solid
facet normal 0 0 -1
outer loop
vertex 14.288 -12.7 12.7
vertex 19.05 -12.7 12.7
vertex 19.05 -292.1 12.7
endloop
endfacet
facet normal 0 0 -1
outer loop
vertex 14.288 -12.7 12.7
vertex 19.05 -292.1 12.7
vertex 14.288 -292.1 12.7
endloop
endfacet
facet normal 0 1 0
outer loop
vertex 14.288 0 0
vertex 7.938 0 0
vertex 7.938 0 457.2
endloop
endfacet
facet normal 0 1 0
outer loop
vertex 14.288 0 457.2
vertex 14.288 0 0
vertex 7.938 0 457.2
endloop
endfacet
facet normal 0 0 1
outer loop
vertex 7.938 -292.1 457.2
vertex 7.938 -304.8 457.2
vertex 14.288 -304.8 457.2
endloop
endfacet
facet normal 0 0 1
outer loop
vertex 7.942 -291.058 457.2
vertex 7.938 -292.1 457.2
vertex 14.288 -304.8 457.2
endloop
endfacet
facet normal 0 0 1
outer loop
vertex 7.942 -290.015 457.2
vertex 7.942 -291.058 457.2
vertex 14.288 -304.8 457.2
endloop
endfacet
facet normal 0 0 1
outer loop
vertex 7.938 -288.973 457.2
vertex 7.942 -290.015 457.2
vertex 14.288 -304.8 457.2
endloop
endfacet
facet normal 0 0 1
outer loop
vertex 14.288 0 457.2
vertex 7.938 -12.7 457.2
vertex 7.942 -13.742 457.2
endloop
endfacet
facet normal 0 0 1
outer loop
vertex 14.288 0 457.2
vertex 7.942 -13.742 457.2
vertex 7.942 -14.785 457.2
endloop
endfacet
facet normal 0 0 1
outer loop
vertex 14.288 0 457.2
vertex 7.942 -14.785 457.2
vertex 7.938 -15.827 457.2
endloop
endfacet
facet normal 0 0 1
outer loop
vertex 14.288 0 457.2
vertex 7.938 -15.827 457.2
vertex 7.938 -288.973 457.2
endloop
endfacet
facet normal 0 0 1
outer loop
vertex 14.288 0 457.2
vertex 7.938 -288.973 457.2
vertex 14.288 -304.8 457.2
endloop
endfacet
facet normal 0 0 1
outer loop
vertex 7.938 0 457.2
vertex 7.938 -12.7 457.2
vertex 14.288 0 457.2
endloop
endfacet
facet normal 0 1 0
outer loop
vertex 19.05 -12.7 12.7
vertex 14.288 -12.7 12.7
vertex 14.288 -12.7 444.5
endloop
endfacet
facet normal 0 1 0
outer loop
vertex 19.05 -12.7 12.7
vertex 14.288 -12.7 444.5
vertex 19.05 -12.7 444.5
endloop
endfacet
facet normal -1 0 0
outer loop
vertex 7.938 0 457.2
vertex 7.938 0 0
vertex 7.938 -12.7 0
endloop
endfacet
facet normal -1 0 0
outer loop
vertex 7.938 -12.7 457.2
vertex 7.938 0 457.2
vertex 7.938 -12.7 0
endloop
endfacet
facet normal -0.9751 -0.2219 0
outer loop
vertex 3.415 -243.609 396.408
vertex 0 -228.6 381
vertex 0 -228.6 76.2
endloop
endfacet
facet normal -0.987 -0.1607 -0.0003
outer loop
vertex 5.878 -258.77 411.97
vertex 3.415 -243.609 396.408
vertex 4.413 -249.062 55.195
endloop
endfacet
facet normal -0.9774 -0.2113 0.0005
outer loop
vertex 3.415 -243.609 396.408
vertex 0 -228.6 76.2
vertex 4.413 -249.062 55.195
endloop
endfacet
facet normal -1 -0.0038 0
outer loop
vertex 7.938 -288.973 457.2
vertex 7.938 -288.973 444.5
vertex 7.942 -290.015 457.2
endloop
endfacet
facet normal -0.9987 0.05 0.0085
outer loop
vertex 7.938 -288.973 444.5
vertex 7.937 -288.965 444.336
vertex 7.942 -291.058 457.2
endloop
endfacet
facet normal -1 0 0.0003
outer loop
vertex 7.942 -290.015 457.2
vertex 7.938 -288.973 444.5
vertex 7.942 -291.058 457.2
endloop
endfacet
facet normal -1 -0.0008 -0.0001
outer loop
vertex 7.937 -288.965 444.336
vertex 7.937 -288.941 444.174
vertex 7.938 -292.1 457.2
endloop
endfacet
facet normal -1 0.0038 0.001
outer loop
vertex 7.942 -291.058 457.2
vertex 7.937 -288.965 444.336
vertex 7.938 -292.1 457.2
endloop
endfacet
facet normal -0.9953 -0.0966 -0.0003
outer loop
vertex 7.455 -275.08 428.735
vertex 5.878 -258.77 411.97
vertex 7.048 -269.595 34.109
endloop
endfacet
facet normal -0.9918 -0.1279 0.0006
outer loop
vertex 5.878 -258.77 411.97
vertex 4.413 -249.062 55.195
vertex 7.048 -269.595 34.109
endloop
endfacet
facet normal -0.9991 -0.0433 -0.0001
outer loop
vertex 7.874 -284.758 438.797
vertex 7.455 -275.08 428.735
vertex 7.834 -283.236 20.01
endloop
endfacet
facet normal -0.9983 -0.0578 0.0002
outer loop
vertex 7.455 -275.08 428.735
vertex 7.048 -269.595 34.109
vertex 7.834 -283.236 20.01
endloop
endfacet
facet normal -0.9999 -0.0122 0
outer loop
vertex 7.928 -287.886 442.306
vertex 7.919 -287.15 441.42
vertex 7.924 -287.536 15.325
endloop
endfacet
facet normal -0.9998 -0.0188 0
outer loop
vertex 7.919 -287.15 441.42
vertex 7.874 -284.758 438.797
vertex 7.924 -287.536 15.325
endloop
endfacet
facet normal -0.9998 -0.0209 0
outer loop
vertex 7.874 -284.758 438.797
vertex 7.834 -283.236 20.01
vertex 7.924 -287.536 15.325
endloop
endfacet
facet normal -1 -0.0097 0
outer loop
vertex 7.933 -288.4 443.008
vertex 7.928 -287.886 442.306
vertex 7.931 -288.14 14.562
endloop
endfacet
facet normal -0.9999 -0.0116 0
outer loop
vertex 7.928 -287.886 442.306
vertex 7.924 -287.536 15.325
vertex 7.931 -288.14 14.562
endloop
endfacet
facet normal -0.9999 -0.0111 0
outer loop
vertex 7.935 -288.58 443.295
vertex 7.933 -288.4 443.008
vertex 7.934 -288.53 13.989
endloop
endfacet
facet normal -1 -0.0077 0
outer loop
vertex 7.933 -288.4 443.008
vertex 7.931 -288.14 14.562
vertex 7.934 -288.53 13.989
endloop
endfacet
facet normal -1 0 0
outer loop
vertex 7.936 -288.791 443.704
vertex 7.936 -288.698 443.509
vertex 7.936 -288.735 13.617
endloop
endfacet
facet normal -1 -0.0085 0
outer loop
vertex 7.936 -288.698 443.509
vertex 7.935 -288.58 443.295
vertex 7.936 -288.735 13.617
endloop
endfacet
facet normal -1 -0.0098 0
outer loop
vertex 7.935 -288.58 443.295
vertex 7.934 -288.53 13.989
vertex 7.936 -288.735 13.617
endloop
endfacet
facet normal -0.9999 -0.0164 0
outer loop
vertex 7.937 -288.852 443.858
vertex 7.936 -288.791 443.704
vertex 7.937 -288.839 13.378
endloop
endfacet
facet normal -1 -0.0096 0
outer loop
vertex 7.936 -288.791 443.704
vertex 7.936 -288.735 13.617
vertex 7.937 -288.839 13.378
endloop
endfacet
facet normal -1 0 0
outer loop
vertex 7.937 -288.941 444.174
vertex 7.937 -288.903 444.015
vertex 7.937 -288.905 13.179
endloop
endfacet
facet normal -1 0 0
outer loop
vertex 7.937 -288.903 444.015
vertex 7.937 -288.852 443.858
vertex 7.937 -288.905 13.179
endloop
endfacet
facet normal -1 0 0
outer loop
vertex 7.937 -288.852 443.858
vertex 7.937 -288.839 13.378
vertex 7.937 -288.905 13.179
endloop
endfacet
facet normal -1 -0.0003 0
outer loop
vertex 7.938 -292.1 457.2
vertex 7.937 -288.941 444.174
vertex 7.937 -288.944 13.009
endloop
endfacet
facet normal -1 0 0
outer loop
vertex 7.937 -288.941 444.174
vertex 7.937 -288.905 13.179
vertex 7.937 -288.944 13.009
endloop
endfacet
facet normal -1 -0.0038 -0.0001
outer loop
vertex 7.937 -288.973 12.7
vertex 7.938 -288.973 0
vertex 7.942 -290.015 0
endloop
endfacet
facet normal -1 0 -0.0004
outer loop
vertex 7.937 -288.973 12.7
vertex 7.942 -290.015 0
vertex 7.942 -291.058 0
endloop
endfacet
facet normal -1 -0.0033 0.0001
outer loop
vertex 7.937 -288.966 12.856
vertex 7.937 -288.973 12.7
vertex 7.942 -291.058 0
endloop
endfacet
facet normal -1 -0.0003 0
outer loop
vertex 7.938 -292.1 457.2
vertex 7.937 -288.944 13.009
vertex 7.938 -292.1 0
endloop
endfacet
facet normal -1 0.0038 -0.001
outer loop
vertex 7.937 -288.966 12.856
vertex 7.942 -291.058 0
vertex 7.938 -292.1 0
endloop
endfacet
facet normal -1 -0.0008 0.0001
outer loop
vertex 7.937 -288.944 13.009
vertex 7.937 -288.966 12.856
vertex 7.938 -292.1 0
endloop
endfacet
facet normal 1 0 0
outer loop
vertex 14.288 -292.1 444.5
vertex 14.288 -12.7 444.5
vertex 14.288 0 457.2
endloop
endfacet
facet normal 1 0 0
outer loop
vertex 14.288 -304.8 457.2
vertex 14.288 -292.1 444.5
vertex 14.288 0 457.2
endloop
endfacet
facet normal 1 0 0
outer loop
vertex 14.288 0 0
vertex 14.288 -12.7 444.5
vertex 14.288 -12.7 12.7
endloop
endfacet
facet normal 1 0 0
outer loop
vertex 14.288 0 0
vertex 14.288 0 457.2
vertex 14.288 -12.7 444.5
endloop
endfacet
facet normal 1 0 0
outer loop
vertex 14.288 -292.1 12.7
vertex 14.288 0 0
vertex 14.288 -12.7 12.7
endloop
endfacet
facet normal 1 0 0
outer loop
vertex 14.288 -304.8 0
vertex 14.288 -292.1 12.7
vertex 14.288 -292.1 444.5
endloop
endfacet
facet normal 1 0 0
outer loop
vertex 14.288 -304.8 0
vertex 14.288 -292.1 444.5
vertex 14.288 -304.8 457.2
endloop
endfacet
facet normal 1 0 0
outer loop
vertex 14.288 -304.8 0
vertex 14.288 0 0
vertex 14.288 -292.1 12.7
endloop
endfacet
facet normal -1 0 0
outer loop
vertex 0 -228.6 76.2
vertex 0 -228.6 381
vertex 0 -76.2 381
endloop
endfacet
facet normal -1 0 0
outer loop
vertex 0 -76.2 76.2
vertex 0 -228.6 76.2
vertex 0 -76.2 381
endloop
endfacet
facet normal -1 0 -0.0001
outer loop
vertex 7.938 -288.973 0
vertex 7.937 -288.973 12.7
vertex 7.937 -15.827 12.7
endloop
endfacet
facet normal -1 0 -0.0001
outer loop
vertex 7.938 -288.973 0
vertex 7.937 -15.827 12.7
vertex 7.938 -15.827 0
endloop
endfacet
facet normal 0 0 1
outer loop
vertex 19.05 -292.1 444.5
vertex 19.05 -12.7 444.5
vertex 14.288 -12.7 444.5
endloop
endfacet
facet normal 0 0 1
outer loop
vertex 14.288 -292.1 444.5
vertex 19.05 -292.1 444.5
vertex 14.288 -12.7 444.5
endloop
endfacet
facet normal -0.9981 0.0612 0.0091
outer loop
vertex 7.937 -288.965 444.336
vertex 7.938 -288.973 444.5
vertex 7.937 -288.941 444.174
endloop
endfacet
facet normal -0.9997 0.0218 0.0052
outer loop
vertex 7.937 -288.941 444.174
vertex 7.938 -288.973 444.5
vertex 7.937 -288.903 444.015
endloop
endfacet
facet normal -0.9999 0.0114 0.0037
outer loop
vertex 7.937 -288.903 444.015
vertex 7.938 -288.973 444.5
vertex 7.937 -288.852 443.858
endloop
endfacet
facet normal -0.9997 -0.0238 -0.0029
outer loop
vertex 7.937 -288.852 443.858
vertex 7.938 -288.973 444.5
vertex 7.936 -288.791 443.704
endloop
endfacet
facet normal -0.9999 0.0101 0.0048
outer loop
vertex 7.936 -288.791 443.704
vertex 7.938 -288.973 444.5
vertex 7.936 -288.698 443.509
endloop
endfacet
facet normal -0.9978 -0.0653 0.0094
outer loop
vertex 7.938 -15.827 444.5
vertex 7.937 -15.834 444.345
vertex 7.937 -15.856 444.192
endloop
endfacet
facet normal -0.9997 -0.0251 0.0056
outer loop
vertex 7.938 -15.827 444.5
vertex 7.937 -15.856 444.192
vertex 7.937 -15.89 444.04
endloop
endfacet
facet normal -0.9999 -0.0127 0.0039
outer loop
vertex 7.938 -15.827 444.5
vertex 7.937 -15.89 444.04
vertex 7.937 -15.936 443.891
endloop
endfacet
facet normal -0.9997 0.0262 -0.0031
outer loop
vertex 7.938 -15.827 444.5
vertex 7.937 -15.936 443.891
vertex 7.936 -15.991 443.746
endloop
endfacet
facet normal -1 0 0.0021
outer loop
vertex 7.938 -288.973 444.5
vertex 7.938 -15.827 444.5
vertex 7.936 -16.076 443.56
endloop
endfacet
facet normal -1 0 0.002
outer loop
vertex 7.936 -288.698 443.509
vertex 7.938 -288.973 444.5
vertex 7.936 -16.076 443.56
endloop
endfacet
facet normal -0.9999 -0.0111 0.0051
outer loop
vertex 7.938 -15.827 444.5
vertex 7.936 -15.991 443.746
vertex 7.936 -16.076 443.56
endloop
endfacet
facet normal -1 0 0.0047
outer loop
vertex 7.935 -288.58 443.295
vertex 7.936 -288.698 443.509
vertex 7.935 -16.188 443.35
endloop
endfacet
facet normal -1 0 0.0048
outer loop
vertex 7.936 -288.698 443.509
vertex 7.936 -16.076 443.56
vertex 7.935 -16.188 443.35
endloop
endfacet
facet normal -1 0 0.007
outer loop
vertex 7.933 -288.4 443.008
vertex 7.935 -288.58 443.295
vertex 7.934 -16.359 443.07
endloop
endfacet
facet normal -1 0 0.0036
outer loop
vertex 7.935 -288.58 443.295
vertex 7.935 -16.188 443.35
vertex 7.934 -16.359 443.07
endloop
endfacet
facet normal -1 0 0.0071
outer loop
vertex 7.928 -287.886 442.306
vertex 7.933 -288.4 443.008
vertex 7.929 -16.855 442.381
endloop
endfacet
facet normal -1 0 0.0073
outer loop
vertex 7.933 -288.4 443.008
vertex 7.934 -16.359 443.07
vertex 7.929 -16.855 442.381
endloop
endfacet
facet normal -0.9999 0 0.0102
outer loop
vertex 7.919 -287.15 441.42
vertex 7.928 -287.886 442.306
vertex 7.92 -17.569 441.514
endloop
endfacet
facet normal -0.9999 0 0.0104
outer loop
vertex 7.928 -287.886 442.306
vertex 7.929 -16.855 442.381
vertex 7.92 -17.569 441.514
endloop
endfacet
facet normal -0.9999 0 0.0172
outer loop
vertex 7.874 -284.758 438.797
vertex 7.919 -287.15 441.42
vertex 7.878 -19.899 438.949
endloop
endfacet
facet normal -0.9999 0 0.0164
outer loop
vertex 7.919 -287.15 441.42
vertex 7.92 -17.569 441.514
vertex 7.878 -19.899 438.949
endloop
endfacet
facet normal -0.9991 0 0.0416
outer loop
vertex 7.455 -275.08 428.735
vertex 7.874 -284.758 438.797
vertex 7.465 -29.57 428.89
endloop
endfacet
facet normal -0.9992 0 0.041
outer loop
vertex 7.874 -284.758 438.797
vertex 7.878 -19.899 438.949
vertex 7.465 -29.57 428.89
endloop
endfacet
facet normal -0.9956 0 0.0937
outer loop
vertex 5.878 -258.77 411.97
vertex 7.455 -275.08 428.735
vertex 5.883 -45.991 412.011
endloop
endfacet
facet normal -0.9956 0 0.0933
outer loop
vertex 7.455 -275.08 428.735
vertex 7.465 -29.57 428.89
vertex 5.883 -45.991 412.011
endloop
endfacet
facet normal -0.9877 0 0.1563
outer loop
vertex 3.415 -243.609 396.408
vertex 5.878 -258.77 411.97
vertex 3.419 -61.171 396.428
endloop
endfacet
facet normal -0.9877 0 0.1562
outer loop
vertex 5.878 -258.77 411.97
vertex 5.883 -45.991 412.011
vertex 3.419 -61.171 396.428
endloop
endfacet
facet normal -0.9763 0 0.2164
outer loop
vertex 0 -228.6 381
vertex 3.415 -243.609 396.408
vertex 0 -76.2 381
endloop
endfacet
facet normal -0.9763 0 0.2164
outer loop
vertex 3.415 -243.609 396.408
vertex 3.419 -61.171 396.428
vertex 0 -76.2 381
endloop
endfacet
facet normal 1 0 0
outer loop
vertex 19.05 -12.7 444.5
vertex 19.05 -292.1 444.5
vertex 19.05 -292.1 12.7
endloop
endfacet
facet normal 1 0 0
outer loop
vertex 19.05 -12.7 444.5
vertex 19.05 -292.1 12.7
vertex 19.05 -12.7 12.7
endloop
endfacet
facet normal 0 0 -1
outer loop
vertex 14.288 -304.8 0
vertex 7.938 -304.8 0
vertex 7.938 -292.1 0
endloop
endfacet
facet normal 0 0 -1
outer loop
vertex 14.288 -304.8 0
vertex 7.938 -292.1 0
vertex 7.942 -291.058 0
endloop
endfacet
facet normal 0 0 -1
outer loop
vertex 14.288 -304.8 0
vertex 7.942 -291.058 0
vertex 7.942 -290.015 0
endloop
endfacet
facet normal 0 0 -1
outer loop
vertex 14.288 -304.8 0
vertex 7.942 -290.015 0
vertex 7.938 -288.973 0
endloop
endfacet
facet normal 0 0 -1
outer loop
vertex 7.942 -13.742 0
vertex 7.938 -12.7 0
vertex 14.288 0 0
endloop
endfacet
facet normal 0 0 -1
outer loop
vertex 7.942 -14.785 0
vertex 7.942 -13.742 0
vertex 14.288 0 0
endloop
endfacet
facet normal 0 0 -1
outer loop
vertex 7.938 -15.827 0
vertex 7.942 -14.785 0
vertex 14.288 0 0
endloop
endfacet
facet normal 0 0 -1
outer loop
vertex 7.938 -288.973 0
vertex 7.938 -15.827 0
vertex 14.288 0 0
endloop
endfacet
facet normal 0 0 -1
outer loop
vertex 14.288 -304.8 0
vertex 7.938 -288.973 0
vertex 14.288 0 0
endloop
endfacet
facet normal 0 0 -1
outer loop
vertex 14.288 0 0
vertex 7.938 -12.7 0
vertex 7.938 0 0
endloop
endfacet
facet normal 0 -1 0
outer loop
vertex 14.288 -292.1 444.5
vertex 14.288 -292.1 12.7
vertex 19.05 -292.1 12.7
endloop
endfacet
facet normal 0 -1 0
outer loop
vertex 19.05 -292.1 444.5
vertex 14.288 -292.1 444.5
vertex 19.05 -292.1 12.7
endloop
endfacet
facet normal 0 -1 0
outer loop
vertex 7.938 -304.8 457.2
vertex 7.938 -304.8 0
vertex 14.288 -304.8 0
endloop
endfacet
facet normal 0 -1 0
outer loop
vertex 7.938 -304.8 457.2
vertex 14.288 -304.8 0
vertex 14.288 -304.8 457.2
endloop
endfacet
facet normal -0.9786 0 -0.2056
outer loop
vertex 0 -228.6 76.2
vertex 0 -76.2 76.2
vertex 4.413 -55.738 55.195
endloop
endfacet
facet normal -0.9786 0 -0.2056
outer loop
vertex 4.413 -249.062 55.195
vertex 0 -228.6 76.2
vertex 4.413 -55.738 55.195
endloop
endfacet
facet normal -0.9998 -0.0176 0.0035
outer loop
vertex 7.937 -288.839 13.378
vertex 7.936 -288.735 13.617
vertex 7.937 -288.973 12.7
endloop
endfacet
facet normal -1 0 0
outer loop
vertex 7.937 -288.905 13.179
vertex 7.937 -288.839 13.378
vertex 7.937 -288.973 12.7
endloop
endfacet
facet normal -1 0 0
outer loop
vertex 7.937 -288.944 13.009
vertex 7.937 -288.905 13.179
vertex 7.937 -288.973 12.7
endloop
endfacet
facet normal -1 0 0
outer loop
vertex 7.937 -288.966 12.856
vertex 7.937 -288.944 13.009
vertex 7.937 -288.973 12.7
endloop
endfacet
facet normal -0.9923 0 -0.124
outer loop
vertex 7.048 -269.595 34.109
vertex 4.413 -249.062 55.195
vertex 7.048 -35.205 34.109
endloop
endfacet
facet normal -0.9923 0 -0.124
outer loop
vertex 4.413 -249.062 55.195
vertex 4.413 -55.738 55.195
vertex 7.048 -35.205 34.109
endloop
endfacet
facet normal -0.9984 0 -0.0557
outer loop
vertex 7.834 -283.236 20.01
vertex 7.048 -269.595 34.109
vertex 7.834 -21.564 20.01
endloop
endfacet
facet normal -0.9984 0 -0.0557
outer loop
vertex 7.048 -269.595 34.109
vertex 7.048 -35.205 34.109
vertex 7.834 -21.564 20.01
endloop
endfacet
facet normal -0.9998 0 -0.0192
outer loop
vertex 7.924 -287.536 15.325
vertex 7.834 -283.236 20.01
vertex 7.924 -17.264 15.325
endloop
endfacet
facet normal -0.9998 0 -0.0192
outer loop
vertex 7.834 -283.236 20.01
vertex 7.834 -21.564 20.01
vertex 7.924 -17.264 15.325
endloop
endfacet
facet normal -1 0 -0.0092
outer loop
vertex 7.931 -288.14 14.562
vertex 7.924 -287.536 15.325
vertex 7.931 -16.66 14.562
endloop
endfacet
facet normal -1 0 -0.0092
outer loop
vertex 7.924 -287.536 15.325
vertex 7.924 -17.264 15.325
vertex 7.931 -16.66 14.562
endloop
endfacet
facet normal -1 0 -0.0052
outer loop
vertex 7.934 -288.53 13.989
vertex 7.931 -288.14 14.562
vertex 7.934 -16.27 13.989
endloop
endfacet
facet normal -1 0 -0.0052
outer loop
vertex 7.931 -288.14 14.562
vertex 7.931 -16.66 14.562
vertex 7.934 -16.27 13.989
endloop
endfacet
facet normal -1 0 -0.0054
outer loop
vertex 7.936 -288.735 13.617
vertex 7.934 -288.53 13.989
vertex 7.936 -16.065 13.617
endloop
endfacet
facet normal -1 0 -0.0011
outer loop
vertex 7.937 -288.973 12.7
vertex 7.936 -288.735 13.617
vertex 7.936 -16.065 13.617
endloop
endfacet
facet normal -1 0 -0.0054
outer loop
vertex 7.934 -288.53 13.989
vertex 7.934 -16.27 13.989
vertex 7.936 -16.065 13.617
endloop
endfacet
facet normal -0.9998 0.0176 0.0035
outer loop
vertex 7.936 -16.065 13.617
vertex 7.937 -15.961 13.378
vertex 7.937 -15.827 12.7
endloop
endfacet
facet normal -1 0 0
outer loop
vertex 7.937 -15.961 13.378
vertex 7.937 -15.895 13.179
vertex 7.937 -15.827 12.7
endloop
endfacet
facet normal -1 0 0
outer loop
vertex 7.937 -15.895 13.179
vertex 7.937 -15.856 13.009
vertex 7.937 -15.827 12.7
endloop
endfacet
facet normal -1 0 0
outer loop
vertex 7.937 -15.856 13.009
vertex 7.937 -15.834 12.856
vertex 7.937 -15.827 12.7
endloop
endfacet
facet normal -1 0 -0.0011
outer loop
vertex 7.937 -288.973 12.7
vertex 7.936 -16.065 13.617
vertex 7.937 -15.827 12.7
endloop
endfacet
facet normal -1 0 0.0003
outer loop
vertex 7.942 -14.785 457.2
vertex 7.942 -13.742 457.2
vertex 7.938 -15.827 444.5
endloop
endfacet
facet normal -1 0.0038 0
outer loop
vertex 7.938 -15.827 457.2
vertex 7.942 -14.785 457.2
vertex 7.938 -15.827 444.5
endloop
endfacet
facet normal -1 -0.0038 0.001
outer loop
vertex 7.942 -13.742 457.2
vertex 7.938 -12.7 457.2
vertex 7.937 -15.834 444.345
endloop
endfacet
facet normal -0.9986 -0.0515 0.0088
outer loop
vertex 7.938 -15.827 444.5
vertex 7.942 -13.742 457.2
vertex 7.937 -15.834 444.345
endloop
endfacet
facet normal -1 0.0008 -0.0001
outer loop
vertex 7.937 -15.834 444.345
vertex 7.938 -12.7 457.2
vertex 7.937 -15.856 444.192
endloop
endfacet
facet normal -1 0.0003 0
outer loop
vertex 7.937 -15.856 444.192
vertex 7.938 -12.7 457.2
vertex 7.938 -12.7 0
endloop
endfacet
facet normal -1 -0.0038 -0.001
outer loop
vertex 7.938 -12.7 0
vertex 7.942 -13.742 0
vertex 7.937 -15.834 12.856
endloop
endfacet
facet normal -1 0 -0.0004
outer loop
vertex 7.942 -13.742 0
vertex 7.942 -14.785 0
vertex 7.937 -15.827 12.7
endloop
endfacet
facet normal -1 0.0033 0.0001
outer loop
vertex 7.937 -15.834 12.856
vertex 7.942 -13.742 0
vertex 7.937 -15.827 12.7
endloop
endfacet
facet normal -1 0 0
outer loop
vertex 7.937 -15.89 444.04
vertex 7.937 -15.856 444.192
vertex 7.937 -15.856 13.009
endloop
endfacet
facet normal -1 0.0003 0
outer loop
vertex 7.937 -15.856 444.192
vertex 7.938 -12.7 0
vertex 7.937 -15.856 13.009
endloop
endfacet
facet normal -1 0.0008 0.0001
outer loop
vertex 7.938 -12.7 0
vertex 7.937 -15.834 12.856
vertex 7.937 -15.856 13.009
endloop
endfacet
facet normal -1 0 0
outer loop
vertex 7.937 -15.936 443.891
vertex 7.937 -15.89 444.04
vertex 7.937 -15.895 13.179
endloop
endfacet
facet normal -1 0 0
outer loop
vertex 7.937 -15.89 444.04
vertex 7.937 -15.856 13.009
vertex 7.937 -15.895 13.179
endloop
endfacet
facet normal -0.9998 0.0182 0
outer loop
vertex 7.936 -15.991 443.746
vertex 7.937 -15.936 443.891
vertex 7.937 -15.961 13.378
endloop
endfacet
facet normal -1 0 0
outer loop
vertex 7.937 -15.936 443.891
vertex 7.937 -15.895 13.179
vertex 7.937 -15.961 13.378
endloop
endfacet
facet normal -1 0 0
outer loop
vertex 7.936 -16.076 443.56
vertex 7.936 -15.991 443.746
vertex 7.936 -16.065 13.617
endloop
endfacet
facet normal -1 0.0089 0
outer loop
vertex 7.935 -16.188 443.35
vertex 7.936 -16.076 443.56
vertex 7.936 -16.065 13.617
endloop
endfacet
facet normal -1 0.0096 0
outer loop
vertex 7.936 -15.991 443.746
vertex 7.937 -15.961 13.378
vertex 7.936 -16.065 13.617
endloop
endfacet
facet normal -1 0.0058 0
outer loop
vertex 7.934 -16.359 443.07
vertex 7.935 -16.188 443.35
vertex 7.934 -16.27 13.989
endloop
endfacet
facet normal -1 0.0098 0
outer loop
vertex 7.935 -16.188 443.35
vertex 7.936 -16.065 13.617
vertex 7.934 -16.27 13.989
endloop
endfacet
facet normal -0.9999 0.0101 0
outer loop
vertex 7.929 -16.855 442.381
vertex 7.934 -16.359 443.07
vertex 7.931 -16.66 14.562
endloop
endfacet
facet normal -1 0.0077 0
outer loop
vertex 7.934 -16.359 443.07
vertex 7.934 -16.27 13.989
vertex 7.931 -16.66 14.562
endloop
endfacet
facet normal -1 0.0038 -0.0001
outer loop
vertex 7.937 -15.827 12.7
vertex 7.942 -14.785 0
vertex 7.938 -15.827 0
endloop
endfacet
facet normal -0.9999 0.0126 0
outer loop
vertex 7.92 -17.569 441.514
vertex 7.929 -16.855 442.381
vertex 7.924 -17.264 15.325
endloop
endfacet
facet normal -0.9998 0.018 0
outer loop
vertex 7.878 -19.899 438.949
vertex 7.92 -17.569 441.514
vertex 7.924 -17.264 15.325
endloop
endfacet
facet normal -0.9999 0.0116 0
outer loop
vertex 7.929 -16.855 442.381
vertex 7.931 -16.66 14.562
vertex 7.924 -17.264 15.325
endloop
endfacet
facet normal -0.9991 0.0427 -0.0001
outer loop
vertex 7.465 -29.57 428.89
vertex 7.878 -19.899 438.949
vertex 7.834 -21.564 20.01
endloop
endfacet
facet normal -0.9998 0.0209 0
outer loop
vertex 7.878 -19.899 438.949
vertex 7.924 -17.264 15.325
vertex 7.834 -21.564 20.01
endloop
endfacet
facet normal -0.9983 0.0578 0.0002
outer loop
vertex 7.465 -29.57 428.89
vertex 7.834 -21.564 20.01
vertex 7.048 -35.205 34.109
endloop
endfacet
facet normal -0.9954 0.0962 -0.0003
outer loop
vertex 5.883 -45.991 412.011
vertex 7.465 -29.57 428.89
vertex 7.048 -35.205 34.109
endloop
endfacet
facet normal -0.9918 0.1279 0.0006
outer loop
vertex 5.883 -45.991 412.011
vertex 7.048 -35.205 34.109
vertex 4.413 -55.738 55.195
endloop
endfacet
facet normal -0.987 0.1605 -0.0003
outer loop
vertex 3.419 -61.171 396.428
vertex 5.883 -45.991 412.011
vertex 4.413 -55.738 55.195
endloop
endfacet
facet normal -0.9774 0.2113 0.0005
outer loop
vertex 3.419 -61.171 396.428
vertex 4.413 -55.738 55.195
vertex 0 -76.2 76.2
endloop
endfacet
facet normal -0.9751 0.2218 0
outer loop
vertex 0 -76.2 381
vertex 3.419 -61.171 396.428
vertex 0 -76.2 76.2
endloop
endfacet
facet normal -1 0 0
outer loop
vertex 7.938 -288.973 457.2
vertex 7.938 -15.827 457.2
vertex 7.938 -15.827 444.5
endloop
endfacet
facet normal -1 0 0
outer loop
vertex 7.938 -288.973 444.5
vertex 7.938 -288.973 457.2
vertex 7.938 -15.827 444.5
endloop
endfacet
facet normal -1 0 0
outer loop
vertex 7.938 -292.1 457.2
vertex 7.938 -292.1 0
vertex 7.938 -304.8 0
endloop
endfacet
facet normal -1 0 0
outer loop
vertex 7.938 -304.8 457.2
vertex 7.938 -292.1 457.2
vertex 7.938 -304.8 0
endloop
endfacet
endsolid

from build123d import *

# Parameters (mm, degrees)
F0_W     = 304.8
F0_H     = 457.2
F1_DEPTH = 19.05
F2_W     = 4.7625
F2_H     = 12.7
F3_DEPTH = 457.201
F4_W     = 4.7625
F4_H     = 12.7
F5_DEPTH = 304.801


with BuildPart() as f1:
    # F0 (on Right) → F1 (new body)
    with BuildSketch(Plane.YZ):
        with Locations((-152.4, 228.6)):
            Rectangle(F0_W, F0_H)
    extrude(amount=F1_DEPTH)

    # F2 (on face) → F3 (cut, through all)
    with BuildSketch(Plane(origin=(0, 0, 0), x_dir=(1, 0, 0), z_dir=(0, 0, -1))):
        with Locations((16.66875, 6.35)):
            Rectangle(F2_W, F2_H)
        with Locations((16.66875, 298.45)):
            Rectangle(F2_W, F2_H)
        with BuildLine():
            Line((0, 0), (7.9375, 0))
            Line((7.9375, 0), (7.9375, 12.7))
            ThreePointArc((7.9375, 12.7), (6.046964, 44.709777), (0, 76.2))
            Line((0, 76.2), (0, 0))
        make_face()
        with BuildLine():
            Line((0, 304.8), (0, 228.6))
            ThreePointArc((0, 228.6), (6.046964, 260.090223), (7.9375, 292.1))
            Line((7.9375, 292.1), (7.9375, 304.8))
            Line((7.9375, 304.8), (0, 304.8))
        make_face()
    extrude(amount=-F3_DEPTH, mode=Mode.SUBTRACT)

    # F4 (on face) → F5 (cut, through all)
    with BuildSketch(Plane(origin=(0, 0, 0), x_dir=(-1, 0, 0), z_dir=(0, 1, 0))):
        with BuildLine():
            Line((0, 457.2), (-7.9375, 457.2))
            Line((-7.9375, 457.2), (-7.9375, 444.5))
            ThreePointArc((-7.9375, 444.5), (-5.945434, 412.502915), (0, 381))
            Line((0, 381), (0, 457.2))
        make_face()
        with BuildLine():
            Line((-7.9375, 12.7), (-7.9375, 0))
            Line((-7.9375, 0), (0, 0))
            Line((0, 0), (0, 76.2))
            ThreePointArc((0, 76.2), (-5.945434, 44.697085), (-7.9375, 12.7))
        make_face()
        with Locations((-16.66875, 450.85)):
            Rectangle(F4_W, F4_H)
        with Locations((-16.66875, 6.35)):
            Rectangle(F4_W, F4_H)
    extrude(amount=-F5_DEPTH, mode=Mode.SUBTRACT)


solid = f1.part
